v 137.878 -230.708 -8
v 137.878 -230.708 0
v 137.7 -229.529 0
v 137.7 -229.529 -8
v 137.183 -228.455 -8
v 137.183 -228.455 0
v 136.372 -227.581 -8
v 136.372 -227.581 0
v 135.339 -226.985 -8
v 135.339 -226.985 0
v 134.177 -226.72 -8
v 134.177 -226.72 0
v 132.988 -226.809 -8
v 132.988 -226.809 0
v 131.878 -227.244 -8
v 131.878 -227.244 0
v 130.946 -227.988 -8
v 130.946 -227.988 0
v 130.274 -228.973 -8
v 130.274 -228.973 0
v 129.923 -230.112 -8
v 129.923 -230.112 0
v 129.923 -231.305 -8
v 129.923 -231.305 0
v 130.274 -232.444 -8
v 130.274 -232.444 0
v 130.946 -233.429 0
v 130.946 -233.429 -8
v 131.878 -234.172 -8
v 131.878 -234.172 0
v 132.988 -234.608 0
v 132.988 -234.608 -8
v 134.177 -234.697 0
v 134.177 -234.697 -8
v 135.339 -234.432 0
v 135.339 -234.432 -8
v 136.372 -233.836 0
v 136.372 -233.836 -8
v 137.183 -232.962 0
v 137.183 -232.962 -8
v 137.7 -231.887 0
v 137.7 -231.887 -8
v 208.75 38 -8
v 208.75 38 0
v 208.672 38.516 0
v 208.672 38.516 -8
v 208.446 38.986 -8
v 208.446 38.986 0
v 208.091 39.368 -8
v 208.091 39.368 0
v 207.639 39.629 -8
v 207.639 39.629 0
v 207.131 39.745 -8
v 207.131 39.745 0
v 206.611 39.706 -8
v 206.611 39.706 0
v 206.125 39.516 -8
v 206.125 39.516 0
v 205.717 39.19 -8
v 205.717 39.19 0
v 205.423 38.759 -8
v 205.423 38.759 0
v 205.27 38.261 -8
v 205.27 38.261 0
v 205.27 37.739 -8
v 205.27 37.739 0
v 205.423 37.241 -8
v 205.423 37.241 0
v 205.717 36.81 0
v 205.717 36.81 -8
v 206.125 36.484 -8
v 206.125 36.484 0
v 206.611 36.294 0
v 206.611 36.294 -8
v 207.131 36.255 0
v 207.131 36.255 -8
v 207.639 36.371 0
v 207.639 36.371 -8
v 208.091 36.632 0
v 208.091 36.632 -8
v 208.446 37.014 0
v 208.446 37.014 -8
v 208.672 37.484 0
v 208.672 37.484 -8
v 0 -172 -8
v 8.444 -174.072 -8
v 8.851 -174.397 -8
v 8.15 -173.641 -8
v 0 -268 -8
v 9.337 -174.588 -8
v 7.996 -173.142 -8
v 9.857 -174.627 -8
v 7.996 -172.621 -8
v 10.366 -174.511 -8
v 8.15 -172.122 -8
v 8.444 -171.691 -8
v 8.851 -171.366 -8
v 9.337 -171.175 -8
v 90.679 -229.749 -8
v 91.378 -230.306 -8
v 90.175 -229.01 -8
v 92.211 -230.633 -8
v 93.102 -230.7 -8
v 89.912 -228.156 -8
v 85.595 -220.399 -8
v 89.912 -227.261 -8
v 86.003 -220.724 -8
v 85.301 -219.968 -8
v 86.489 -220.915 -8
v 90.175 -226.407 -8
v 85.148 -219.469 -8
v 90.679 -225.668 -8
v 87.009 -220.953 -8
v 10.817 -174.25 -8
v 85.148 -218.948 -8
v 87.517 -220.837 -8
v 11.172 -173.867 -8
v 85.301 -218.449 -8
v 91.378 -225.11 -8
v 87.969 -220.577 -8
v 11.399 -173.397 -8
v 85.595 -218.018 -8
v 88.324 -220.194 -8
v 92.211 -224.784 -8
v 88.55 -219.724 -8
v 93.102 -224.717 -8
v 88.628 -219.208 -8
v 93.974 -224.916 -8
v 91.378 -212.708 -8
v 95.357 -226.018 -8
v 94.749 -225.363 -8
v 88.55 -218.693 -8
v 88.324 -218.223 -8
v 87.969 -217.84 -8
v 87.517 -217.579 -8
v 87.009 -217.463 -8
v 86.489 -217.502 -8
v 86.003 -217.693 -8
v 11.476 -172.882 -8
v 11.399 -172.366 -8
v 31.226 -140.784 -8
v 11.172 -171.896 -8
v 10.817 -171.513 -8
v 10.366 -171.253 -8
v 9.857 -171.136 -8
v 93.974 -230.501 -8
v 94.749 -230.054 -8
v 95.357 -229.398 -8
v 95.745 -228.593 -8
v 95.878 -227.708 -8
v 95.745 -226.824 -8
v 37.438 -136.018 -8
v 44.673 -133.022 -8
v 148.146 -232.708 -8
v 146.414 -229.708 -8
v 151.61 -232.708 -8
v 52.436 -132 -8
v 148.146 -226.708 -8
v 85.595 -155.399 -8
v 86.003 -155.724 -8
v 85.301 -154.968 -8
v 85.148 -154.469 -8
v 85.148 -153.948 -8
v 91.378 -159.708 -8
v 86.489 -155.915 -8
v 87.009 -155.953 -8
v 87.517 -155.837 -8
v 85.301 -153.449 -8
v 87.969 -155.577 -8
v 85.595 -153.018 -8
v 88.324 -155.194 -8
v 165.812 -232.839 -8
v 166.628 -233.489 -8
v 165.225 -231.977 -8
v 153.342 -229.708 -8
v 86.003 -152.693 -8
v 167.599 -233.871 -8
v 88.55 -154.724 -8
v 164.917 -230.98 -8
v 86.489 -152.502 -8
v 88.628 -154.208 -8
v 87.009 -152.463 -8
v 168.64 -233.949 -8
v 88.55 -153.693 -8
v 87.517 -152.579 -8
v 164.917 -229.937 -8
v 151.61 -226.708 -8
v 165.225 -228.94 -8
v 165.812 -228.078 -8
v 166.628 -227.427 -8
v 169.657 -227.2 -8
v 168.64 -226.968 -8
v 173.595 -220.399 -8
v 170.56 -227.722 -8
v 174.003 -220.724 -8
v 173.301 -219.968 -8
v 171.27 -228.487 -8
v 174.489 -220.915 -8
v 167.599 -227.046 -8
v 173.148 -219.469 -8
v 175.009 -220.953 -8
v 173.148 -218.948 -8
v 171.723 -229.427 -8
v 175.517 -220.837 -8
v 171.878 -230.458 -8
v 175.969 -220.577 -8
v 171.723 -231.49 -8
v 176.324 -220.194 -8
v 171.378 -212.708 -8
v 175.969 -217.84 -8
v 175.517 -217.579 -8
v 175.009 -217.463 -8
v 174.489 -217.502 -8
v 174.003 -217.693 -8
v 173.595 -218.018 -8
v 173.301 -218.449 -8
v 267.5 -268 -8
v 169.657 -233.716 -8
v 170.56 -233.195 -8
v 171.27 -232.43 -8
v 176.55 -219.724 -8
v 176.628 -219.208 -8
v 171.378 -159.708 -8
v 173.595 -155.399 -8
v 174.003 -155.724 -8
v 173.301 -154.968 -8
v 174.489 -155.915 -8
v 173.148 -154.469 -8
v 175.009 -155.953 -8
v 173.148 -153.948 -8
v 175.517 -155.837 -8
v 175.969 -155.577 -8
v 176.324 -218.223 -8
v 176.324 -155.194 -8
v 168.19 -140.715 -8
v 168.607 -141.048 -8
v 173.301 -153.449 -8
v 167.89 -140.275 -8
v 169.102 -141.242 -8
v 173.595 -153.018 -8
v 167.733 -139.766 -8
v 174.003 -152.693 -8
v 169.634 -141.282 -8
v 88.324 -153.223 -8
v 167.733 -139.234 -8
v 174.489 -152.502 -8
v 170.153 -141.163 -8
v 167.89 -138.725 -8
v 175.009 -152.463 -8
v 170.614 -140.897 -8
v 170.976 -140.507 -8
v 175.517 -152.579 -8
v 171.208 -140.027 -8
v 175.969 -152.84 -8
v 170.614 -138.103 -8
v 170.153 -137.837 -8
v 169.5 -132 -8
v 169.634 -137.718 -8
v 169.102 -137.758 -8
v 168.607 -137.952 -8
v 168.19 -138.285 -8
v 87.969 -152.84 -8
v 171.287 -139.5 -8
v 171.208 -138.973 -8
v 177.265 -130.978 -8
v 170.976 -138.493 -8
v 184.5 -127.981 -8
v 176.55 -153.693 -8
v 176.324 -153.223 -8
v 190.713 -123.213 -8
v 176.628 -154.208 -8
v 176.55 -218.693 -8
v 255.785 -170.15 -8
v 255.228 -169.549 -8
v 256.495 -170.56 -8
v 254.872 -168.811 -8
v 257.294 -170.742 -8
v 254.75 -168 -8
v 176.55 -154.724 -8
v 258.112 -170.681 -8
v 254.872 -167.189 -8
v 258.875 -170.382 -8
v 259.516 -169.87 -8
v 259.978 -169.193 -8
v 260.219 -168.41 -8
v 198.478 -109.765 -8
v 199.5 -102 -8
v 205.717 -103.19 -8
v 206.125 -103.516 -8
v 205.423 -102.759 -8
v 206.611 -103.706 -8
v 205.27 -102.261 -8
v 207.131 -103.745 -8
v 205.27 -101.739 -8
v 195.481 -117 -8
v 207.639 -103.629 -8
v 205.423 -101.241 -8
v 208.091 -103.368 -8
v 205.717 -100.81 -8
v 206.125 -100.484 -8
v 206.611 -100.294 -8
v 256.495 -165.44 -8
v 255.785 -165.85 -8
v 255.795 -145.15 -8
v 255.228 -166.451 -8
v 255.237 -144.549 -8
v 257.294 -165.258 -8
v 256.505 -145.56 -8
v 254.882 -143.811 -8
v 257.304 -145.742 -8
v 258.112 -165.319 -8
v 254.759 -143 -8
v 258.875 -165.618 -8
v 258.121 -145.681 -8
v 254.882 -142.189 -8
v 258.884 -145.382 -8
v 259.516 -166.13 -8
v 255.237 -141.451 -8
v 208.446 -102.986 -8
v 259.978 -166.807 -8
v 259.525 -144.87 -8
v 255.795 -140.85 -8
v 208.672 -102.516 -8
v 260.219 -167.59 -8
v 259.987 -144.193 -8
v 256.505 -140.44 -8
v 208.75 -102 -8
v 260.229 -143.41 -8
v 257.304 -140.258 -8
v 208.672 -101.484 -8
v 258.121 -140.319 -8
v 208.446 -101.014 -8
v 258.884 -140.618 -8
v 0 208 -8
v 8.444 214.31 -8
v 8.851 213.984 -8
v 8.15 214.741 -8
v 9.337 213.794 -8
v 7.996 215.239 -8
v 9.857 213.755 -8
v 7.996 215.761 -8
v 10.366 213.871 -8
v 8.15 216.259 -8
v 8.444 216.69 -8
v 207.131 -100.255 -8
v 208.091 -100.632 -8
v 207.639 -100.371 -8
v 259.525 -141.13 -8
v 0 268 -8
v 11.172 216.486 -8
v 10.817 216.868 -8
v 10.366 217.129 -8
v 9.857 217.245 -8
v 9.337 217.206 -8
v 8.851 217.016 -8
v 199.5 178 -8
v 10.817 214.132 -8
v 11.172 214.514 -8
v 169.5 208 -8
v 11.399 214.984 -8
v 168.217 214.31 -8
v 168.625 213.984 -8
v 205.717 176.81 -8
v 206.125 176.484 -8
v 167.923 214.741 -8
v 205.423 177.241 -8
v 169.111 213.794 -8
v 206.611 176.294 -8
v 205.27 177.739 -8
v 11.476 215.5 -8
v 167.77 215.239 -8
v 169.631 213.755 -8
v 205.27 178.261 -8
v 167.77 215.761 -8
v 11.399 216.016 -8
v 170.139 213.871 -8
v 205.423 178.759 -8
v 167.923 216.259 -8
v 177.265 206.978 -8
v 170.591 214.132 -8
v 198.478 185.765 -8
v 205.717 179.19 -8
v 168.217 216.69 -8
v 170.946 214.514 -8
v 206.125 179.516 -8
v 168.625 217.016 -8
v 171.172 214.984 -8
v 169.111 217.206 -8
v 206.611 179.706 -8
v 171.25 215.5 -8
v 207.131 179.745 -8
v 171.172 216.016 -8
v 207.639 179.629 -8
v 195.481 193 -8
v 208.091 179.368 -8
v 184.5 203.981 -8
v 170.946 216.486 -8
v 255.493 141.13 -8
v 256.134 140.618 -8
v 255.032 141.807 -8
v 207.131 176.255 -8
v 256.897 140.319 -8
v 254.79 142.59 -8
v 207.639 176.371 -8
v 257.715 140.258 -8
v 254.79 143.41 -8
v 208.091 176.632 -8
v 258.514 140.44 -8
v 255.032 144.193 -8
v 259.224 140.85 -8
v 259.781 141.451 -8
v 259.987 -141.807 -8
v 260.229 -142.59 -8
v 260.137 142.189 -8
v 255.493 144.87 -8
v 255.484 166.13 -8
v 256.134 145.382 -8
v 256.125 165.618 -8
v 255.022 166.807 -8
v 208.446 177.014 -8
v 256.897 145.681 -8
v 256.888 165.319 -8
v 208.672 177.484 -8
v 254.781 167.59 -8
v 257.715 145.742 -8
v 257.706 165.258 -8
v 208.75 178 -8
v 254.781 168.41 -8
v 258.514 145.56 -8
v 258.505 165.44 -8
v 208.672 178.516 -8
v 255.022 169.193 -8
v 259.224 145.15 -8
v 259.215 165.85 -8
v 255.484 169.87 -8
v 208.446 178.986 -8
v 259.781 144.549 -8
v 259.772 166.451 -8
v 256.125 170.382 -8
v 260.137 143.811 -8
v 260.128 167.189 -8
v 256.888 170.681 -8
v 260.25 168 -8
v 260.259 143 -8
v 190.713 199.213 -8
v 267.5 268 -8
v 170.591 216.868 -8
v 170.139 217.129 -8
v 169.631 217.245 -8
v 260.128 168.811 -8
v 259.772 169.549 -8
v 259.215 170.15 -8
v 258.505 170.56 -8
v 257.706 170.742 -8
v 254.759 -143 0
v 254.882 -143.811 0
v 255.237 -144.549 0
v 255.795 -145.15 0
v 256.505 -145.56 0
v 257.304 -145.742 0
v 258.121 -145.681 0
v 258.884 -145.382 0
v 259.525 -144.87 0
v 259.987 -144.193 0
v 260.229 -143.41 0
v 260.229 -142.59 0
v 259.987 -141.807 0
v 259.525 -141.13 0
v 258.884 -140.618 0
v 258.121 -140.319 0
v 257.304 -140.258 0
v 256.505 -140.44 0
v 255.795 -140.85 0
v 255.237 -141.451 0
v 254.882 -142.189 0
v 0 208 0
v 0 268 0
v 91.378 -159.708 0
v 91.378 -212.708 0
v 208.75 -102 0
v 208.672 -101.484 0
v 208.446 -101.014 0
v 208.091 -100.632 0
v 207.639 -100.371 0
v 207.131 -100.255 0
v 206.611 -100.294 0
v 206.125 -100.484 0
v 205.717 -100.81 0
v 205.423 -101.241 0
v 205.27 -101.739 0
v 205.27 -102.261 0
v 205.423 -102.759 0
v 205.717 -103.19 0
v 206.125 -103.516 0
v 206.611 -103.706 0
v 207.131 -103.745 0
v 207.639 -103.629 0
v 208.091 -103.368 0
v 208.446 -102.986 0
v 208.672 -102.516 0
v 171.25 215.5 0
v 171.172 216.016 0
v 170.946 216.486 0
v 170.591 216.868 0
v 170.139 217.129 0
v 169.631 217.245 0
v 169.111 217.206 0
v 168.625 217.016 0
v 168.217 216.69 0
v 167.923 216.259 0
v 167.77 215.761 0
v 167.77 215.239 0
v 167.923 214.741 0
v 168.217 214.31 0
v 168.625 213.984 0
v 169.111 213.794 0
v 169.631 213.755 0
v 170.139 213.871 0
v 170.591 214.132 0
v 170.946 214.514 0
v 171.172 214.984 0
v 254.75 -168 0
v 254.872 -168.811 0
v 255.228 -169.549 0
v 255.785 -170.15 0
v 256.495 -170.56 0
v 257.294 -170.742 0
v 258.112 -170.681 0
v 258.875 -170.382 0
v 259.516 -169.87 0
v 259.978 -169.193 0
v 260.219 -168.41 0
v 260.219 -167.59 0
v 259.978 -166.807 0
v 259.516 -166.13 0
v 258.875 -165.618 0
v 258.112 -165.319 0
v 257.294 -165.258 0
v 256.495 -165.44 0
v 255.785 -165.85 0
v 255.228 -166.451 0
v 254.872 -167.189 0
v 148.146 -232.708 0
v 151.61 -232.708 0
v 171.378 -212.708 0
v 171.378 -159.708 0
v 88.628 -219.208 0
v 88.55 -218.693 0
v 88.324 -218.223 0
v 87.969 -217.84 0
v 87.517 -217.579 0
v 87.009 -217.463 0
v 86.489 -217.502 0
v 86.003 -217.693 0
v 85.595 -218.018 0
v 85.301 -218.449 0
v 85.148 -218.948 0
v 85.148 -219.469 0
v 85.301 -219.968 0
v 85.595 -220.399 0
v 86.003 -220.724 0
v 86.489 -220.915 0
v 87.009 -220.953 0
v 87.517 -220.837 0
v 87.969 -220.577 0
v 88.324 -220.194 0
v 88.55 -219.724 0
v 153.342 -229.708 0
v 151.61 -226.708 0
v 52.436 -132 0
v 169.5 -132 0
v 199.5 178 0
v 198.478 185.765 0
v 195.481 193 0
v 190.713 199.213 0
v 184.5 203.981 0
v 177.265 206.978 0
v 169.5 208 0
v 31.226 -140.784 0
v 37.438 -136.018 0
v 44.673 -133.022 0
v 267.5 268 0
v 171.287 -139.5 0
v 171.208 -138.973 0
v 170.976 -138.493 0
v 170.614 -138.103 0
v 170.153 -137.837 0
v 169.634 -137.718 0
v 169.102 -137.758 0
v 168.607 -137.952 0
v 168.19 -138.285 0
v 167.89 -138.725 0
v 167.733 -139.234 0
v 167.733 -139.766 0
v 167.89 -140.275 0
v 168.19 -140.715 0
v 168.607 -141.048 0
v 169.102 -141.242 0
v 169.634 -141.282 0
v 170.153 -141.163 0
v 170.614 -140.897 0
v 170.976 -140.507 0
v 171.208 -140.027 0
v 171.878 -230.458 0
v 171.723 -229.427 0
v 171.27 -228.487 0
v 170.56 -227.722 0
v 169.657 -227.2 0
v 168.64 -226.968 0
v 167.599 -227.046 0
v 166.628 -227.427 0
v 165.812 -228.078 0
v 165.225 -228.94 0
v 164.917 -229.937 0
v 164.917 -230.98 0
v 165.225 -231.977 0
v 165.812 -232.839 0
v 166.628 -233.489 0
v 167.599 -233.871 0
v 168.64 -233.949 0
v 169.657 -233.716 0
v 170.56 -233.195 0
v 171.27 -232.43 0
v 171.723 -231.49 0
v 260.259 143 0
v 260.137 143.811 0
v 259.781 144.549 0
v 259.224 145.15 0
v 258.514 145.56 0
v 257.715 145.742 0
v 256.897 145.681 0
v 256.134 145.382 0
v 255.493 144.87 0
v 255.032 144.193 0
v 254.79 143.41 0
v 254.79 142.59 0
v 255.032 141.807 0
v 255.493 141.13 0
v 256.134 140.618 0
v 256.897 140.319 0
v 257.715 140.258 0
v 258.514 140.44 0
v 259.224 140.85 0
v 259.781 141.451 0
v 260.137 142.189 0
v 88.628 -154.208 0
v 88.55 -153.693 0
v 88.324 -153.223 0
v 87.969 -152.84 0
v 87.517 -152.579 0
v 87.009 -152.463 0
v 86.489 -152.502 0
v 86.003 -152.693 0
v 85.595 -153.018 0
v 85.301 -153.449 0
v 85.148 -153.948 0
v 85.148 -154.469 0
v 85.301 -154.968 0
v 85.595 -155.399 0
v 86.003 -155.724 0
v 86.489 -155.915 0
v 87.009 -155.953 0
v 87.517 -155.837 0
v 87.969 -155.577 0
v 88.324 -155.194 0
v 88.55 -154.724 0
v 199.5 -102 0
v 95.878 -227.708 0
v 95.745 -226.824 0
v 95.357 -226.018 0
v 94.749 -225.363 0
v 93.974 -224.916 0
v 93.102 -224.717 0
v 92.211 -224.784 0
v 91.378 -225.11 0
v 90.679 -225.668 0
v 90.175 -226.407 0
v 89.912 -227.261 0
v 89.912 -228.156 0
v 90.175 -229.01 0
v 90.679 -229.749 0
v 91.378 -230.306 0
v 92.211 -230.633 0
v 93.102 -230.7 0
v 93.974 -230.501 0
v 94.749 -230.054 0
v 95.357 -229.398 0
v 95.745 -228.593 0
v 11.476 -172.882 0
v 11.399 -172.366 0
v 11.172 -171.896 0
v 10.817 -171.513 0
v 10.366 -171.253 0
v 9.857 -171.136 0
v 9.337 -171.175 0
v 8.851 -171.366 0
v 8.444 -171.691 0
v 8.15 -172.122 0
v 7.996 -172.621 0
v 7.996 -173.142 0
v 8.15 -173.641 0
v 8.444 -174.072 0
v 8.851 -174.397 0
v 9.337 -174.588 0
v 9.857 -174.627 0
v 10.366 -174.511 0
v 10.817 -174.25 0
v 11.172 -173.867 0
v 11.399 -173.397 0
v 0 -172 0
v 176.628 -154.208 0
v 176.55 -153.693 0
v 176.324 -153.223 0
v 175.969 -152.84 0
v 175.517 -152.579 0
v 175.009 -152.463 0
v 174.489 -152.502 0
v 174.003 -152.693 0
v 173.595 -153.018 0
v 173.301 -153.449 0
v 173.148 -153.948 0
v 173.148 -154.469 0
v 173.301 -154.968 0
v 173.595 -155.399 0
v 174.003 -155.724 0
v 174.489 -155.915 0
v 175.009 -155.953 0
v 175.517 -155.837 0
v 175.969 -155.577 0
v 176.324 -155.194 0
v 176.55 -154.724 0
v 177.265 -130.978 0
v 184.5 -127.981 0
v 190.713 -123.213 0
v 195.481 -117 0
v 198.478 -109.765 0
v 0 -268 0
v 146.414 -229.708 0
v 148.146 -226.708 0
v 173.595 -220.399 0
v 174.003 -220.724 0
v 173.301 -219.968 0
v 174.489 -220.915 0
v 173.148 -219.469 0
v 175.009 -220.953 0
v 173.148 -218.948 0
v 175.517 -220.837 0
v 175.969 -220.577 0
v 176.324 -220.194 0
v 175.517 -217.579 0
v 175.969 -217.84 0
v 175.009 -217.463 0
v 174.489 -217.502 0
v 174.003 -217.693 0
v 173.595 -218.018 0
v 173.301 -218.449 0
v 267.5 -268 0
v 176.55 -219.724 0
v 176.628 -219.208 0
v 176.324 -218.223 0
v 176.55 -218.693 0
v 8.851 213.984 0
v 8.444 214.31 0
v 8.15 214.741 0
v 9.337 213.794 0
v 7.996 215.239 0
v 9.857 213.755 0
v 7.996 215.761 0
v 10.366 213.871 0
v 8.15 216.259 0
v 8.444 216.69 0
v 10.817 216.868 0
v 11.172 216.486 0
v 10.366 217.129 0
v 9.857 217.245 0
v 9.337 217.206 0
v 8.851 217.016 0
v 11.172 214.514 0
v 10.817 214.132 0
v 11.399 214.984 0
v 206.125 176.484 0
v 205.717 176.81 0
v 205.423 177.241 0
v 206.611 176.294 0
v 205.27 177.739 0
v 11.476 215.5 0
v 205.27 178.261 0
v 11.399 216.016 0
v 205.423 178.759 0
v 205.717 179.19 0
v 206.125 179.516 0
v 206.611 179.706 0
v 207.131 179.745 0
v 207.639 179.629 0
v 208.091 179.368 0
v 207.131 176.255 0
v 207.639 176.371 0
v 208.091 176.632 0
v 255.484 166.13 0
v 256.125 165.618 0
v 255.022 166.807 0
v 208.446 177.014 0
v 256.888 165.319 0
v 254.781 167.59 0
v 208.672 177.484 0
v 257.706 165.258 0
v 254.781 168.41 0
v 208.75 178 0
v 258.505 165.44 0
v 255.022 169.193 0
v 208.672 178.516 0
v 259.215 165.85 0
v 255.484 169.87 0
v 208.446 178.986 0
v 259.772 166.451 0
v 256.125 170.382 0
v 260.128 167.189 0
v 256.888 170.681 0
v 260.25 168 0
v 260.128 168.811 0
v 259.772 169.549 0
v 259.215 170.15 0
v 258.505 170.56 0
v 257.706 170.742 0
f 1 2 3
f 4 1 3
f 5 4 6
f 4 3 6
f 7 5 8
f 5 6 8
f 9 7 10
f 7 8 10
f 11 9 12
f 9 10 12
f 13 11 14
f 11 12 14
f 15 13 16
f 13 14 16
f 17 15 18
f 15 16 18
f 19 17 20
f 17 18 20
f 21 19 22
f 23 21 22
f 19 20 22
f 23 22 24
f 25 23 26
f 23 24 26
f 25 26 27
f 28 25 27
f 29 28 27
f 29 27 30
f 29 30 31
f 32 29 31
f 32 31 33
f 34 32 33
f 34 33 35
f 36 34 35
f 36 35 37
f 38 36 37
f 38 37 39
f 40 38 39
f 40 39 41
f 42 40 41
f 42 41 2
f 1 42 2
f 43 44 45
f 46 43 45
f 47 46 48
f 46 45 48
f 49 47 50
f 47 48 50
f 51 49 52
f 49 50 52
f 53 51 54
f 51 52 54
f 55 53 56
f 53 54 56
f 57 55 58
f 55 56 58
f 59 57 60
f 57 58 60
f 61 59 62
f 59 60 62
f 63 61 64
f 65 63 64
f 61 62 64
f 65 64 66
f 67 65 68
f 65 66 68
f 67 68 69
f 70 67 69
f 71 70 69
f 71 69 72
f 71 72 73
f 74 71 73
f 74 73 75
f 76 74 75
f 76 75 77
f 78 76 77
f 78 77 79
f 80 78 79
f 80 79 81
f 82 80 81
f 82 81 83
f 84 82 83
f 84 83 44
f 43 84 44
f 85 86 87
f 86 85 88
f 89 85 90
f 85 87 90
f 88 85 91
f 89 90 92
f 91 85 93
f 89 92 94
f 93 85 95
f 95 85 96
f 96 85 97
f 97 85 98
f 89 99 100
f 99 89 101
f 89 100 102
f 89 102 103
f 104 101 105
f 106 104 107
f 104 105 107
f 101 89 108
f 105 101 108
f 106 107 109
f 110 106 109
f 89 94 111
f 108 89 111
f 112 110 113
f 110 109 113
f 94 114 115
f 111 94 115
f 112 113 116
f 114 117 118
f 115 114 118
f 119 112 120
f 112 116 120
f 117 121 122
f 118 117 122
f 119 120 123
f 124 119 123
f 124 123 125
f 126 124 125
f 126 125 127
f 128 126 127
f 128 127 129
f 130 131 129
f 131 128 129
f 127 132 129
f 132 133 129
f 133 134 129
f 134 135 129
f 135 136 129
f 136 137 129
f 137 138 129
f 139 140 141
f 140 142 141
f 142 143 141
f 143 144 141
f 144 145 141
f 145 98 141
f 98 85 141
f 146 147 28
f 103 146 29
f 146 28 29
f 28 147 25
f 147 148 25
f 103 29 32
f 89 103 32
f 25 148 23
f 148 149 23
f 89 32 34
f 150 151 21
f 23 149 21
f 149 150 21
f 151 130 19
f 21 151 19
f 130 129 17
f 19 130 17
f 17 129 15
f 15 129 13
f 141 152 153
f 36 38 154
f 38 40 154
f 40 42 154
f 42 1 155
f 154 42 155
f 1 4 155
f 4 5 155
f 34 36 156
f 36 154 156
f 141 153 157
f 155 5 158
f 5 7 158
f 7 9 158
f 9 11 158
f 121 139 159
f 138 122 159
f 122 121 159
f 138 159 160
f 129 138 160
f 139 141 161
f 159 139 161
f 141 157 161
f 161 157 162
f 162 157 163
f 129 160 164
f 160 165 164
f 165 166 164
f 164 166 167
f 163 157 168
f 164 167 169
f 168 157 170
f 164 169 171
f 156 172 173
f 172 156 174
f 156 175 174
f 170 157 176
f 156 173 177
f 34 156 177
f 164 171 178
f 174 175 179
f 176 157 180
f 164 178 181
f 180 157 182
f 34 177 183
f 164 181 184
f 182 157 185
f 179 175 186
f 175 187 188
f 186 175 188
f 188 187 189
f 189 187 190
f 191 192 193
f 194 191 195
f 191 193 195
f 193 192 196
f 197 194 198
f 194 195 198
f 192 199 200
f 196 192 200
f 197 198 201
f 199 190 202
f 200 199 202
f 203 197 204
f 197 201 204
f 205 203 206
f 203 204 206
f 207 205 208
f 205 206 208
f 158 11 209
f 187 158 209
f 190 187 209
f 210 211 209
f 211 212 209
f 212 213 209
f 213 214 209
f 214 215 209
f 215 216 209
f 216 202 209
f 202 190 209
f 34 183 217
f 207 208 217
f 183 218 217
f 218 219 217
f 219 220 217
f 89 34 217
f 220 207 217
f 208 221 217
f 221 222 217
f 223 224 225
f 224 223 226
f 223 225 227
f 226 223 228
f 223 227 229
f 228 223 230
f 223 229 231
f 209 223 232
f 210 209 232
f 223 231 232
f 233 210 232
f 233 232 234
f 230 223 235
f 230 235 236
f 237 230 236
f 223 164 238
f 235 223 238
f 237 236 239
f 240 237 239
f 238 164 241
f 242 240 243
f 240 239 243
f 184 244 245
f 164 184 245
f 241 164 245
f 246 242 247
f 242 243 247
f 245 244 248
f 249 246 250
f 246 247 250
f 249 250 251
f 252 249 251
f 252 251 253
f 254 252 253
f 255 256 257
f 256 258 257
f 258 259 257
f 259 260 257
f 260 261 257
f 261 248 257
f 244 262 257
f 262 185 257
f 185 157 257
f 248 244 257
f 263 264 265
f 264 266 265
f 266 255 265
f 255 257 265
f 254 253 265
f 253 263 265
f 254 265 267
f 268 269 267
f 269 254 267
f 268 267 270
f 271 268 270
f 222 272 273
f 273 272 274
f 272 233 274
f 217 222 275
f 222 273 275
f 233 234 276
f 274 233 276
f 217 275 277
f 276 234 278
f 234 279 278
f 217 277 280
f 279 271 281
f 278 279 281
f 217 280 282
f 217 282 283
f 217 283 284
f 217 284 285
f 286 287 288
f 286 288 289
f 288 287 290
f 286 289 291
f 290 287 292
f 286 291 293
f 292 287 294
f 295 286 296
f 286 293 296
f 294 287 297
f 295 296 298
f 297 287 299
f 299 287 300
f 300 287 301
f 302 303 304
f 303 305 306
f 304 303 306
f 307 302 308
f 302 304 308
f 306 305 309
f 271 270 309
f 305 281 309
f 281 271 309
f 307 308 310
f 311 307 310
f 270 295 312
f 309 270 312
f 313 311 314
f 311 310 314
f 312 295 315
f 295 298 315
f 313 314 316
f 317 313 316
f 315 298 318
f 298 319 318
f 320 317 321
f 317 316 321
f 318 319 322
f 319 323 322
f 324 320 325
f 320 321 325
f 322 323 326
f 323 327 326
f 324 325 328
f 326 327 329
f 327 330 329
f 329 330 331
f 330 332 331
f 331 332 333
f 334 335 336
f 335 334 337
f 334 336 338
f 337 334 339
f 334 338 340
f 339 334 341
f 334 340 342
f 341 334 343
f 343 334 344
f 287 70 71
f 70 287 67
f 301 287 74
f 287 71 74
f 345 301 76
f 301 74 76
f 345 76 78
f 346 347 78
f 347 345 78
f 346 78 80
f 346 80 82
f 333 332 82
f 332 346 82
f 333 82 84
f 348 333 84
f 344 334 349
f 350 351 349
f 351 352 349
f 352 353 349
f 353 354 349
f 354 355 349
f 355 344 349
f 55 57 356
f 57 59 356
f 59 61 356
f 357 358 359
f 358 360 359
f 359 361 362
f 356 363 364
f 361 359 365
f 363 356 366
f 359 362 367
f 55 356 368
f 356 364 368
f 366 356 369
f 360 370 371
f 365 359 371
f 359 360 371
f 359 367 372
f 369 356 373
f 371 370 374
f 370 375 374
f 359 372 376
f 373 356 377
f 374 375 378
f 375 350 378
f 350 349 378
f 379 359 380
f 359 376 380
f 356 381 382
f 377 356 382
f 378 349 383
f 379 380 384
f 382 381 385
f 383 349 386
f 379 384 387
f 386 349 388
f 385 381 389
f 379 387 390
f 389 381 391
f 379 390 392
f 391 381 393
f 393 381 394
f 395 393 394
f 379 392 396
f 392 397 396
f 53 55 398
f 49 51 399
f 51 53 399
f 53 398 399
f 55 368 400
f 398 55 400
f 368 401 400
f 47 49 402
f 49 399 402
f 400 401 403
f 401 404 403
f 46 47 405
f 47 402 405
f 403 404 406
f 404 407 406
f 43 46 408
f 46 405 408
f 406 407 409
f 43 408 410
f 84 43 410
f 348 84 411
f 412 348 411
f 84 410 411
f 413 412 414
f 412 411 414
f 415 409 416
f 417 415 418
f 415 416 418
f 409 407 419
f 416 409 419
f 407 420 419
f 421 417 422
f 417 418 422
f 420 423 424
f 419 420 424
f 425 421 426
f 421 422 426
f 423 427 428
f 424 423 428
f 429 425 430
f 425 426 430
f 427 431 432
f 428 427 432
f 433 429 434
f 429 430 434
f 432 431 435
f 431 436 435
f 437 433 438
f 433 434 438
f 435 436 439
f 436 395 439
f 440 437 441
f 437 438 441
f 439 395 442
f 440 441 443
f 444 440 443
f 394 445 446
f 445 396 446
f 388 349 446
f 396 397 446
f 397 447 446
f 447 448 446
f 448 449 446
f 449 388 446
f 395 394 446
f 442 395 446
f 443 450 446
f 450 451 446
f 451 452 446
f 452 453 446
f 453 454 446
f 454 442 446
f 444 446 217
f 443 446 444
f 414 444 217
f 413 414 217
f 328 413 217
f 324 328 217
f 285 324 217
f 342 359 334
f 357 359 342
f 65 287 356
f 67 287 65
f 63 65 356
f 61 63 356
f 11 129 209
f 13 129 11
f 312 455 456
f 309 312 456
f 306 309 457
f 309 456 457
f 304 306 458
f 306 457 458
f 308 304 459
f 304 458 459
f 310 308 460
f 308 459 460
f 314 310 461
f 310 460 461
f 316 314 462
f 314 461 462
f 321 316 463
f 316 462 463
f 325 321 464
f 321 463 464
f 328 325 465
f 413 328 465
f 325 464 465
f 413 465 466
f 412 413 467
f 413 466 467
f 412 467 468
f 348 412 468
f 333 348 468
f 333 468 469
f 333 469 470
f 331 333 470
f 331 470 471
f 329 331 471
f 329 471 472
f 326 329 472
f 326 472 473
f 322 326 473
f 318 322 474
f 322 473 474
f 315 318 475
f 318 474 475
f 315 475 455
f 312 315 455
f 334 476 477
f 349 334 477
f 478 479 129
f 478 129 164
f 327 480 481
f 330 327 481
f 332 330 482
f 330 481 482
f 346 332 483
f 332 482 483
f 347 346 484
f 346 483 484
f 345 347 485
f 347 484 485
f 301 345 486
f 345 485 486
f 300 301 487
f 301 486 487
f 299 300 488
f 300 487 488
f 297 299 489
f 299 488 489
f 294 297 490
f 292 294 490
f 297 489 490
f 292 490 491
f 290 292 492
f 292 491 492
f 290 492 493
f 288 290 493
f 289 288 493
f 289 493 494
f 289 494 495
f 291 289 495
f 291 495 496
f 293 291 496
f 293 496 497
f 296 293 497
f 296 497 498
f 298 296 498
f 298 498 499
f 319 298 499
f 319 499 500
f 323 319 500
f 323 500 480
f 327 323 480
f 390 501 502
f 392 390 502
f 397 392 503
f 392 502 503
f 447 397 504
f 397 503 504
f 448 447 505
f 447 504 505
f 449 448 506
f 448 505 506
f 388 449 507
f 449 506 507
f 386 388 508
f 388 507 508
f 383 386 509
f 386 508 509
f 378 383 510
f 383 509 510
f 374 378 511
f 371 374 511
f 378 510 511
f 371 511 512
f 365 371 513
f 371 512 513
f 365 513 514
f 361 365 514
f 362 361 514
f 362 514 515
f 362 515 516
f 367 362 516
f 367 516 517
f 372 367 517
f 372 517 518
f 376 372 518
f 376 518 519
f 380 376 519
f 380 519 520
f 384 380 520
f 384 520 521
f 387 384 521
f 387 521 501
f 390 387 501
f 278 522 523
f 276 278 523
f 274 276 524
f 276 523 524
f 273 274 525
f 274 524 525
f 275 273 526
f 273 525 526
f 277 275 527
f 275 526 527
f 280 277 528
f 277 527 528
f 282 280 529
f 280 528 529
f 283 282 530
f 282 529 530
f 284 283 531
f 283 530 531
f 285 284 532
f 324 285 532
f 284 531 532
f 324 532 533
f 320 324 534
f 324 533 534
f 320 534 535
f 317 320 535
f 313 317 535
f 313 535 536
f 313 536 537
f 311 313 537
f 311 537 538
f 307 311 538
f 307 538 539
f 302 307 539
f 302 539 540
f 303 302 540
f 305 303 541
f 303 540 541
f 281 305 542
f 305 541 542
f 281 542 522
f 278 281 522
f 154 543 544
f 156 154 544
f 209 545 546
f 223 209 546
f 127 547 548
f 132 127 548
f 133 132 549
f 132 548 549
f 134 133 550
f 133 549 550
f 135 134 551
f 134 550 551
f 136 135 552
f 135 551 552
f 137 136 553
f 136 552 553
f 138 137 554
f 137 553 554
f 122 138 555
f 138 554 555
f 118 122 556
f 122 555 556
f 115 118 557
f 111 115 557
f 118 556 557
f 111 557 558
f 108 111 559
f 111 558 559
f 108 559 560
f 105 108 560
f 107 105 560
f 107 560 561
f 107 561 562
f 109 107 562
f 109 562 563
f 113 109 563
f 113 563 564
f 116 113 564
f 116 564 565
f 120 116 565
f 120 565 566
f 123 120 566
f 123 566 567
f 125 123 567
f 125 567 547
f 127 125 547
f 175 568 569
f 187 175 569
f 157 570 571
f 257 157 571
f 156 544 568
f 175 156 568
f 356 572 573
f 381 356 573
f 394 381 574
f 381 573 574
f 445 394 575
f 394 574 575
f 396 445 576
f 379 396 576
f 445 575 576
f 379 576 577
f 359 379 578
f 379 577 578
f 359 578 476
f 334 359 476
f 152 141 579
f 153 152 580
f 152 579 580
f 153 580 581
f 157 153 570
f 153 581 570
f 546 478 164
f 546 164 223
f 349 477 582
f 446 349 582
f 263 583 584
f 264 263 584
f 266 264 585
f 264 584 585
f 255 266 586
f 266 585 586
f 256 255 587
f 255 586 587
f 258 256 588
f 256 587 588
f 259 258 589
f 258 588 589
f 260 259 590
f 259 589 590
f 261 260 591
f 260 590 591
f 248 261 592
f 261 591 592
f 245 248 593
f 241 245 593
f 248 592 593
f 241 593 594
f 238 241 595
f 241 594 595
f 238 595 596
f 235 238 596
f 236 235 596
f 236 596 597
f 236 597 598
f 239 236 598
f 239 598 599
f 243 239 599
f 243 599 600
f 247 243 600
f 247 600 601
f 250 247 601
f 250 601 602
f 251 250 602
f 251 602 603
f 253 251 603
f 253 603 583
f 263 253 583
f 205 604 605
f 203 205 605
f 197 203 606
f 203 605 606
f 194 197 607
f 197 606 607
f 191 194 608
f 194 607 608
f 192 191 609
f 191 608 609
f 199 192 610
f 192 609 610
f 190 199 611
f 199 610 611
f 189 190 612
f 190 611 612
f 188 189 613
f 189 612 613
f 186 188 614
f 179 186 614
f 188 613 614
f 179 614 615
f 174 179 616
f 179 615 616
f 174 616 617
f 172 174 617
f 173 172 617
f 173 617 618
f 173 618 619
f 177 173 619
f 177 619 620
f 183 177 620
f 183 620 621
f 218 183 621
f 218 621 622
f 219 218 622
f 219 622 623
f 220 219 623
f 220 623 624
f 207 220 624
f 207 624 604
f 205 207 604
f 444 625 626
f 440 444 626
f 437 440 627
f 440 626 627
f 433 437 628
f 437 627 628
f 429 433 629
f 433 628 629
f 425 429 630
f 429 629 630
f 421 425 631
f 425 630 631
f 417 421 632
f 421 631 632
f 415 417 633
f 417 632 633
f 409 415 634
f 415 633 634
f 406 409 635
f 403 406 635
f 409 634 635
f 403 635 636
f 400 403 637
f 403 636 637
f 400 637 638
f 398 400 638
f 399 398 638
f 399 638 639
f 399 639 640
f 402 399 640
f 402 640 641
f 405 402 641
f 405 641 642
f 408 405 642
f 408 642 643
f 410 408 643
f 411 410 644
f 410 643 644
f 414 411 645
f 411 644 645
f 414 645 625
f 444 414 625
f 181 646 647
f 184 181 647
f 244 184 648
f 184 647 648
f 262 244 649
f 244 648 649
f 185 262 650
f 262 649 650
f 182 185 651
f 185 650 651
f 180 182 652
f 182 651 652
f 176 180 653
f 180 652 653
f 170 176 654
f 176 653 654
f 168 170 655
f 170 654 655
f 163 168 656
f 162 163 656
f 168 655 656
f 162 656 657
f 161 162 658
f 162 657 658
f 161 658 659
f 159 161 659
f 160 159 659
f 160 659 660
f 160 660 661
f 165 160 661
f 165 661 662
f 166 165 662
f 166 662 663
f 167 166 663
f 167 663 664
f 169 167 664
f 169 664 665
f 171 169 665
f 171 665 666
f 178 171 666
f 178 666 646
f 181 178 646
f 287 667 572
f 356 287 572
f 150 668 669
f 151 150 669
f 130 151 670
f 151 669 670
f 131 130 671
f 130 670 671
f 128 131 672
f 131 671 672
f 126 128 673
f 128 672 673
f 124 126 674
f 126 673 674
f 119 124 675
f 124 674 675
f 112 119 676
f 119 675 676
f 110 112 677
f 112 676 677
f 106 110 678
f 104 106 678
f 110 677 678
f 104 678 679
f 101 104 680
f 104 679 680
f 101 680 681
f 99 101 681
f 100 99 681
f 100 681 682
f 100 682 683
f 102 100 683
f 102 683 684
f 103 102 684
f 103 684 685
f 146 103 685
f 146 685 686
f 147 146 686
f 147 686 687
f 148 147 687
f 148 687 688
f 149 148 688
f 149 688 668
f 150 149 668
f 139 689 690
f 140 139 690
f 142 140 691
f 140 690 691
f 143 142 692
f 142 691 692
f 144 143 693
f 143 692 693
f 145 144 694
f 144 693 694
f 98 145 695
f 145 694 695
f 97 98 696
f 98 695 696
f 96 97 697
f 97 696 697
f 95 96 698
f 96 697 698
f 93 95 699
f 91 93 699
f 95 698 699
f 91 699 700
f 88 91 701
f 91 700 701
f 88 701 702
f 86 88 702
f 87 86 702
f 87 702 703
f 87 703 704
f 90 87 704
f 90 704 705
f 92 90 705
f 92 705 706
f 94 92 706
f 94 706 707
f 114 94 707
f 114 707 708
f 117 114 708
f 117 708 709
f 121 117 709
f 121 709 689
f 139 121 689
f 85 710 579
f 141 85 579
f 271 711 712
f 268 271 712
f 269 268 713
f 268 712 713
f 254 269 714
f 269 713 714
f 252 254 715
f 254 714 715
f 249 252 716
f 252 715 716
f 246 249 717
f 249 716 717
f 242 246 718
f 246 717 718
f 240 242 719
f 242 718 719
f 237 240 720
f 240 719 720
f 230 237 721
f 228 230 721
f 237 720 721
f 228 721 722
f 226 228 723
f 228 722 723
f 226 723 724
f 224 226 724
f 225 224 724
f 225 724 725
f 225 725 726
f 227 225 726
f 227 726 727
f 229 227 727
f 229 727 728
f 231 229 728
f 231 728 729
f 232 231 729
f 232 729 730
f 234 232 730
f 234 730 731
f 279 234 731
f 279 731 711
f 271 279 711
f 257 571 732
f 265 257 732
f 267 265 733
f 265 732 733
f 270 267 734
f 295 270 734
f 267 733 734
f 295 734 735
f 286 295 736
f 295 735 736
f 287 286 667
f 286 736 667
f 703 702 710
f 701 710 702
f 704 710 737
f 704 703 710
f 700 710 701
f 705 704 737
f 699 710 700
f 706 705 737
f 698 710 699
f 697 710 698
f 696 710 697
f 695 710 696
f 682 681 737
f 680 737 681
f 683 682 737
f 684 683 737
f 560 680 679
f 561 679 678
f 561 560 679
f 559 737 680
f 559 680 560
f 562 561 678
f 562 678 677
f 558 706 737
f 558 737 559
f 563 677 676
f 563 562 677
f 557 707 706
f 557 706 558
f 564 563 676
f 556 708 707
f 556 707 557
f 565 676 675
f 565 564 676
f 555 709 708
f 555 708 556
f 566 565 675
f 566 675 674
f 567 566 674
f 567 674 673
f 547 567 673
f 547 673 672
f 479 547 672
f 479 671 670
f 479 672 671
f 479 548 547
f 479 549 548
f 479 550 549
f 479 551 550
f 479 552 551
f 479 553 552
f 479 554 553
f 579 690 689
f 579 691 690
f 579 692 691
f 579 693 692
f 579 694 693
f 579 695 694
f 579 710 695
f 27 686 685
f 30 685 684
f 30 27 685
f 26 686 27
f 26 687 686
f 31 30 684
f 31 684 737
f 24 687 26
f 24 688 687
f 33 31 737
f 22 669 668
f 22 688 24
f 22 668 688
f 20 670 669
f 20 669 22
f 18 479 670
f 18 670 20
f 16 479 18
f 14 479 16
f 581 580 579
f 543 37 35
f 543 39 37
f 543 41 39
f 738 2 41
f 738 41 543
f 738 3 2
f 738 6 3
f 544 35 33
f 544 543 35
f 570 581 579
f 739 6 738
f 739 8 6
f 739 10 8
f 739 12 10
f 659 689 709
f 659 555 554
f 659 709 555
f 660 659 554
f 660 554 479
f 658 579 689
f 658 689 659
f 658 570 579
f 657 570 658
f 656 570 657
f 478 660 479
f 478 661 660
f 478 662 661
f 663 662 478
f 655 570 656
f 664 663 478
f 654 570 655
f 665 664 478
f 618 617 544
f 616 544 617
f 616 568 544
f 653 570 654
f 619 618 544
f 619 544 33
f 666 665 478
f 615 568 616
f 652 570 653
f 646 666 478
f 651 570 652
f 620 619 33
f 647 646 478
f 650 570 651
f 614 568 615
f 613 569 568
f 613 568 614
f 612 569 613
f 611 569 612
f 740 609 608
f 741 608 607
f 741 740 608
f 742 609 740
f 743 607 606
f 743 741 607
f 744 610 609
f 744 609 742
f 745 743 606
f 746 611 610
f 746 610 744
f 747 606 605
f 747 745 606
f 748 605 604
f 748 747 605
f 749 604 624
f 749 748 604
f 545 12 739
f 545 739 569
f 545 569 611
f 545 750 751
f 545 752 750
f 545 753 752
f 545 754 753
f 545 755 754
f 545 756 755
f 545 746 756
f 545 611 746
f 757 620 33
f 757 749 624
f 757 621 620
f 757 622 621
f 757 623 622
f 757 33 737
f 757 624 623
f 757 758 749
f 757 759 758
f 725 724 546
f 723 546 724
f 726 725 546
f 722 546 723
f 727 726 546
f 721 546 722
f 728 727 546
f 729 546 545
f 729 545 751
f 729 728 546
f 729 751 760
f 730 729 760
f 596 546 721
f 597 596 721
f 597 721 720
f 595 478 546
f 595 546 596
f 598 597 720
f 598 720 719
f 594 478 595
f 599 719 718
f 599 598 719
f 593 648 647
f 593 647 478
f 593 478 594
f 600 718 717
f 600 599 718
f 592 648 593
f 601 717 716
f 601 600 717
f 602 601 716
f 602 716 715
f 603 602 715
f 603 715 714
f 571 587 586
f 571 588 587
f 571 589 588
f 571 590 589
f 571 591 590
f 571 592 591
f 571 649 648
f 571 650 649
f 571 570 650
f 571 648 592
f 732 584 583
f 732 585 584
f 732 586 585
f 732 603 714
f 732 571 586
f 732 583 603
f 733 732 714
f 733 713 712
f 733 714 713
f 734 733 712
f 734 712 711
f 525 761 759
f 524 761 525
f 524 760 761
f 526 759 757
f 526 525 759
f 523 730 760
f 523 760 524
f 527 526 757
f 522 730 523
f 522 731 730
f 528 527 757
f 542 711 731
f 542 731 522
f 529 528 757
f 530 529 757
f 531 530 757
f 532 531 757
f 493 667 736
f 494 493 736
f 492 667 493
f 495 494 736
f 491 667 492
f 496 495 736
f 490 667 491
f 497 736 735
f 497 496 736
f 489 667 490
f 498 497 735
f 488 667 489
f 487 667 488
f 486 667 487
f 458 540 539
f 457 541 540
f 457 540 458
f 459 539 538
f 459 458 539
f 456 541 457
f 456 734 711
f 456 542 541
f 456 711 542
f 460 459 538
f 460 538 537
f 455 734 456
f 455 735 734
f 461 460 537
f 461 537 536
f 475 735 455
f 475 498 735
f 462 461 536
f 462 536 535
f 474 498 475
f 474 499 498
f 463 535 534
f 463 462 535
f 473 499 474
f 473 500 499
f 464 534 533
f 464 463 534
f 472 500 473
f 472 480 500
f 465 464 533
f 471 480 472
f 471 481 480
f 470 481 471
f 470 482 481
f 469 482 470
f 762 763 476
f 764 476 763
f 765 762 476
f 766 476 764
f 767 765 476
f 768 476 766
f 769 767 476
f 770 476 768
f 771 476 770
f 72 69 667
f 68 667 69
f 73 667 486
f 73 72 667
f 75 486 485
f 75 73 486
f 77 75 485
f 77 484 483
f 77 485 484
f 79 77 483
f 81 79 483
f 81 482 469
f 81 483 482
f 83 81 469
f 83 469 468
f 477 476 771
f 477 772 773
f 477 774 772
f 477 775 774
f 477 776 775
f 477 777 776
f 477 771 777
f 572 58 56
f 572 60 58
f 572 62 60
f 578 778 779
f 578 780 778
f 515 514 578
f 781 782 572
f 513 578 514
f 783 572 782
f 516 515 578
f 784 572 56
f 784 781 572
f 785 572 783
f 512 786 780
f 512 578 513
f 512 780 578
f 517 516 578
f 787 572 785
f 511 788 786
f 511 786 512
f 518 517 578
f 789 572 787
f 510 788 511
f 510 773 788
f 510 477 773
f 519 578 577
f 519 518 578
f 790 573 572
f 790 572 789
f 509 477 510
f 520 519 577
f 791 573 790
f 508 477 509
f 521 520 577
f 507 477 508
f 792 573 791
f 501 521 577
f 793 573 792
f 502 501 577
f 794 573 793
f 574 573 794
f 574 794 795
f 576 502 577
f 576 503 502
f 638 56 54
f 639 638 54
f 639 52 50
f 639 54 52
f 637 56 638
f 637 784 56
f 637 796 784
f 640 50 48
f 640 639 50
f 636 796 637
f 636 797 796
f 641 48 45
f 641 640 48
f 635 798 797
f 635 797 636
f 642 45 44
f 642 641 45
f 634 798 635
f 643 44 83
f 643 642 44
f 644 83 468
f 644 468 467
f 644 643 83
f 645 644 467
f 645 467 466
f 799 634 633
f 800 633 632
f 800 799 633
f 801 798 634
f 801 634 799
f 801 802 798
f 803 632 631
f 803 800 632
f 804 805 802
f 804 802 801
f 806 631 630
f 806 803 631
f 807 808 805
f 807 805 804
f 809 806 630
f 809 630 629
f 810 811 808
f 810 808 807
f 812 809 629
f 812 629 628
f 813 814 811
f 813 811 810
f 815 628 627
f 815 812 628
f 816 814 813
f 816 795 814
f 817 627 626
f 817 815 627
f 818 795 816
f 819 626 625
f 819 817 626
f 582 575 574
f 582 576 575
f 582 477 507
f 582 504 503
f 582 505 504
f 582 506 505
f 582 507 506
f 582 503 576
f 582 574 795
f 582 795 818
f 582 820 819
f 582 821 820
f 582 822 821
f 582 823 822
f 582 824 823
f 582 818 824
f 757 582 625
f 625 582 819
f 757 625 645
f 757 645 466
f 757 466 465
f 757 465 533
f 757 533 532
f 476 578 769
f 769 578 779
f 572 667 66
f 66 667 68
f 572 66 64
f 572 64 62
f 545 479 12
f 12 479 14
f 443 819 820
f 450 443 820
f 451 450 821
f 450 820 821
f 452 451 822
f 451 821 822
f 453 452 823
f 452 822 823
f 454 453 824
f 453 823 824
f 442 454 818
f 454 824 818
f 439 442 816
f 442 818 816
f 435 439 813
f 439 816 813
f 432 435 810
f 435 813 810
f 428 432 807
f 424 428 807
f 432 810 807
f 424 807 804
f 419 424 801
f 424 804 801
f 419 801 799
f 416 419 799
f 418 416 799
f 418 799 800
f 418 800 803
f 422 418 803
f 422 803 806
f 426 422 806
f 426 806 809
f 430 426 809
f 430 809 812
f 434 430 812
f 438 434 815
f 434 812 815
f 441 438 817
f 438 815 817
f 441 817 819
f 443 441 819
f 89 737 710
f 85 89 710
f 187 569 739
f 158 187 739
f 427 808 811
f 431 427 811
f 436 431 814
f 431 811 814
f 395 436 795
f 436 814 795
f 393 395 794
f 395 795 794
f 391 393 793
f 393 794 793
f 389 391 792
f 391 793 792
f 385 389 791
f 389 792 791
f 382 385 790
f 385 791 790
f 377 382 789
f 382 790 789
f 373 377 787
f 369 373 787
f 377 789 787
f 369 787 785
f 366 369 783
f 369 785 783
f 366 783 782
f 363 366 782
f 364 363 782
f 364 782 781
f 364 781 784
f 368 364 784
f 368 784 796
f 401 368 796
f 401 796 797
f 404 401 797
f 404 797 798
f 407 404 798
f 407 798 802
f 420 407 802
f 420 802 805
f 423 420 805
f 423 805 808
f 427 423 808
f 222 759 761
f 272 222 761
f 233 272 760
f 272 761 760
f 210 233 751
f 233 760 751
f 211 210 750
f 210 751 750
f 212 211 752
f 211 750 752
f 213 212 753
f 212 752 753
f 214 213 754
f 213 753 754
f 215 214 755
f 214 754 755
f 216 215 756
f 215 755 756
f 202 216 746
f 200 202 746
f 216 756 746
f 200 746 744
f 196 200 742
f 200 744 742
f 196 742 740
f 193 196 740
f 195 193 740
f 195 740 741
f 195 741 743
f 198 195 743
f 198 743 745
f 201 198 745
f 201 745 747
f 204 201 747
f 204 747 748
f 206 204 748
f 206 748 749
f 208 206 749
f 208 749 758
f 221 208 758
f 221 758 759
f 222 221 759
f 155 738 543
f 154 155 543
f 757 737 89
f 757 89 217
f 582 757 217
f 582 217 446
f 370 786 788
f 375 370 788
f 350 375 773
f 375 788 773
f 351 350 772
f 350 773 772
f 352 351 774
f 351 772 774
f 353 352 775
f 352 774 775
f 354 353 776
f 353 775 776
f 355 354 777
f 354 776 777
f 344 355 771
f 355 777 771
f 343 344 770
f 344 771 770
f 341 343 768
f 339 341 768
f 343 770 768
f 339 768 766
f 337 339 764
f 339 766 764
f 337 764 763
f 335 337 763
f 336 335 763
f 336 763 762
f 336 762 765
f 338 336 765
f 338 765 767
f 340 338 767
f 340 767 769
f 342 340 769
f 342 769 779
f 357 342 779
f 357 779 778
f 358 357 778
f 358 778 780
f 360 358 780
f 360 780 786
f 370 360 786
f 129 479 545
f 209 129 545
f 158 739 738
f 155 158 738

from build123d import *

# Parameters (mm, degrees)
SKETCH1_W           = 267.5
SKETCH1_H           = 536
SKETCH1_R           = 2.75
BOSS_EXTRUDE1_DEPTH = 8
SKETCH3_R           = 2.75
SKETCH3_R_2         = 1.75
SKETCH3_R_3         = 3.5
SKETCH3_R_4         = 4
SKETCH3_R_5         = 3
SKETCH3_W           = 80
SKETCH3_H           = 53
CUT_EXTRUDE3_DEPTH  = 379.740346412
SKETCH4_R           = 1.75
SKETCH4_R_2         = 1.786950001
CUT_EXTRUDE4_DEPTH  = 10


with BuildPart() as part:
    # Sketch1 → Boss-Extrude1 (new body)
    with BuildSketch(Plane.XY):
        with Locations((133.75, 0)):
            Rectangle(SKETCH1_W, SKETCH1_H)
        with Locations(Location((257.5, -168, 0), (0, 0, 180))):
            Circle(SKETCH1_R, mode=Mode.SUBTRACT)
        with Locations(Location((257.509341423, -143.000001745, 0), (0, 0, 180))):
            Circle(SKETCH1_R, mode=Mode.SUBTRACT)
        with Locations((257.509341423, 143.000001745)):
            Circle(SKETCH1_R, mode=Mode.SUBTRACT)
        with Locations((257.5, 168)):
            Circle(SKETCH1_R, mode=Mode.SUBTRACT)
    extrude(amount=-BOSS_EXTRUDE1_DEPTH)

    # Sketch3 → Cut-Extrude3 (cut, through all)
    with BuildSketch(Plane.XY):
        with Locations(Location((257.509341423, -143.000001745, 0), (0, 0, 180))):
            Circle(SKETCH3_R)
        with Locations(Location((257.5, -168, 0), (0, 0, 180))):
            Circle(SKETCH3_R)
        with Locations((86.878100048, -154.208377346)):
            Circle(SKETCH3_R_2)
        with Locations((174.878100048, -154.208377346)):
            Circle(SKETCH3_R_2)
        with Locations((174.878100048, -219.208377346)):
            Circle(SKETCH3_R_2)
        with Locations((86.878100048, -219.208377346)):
            Circle(SKETCH3_R_2)
        with Locations((168.378100048, -230.458377346)):
            Circle(SKETCH3_R_3)
        with Locations((133.878100048, -230.708377346)):
            Circle(SKETCH3_R_4)
        with Locations((92.878100048, -227.708377346)):
            Circle(SKETCH3_R_5)
        with BuildLine():
            Line((0, 208), (0, -172))
            Line((0, -172), (31.225700951, -140.783627636))
            ThreePointArc((31.225700951, -140.783627636), (40.957302403, -134.282756532), (52.435734985, -132))
            Line((52.435734985, -132), (169.5, -132))
            ThreePointArc((169.5, -132), (190.713203436, -123.213203436), (199.5, -102))
            Line((199.5, -102), (199.5, 178))
            ThreePointArc((199.5, 178), (190.713203436, 199.213203436), (169.5, 208))
            Line((169.5, 208), (0, 208))
        make_face()
        Polygon((153.342201663, -229.708377346), (151.610150855, -226.708377346), (148.14604924, -226.708377346), (146.413998433, -229.708377346), (148.14604924, -232.708377346), (151.610150855, -232.708377346), align=None)
        with Locations((131.378100048, -186.208377346)):
            Rectangle(SKETCH3_W, SKETCH3_H)
    extrude(amount=-CUT_EXTRUDE3_DEPTH, mode=Mode.SUBTRACT)

    # Sketch4 → Cut-Extrude4 (cut)
    with BuildSketch(Plane.XY):
        with Locations((9.726391767, -172.881531455)):
            Circle(SKETCH4_R)
        with Locations((169.5, -139.5)):
            Circle(SKETCH4_R_2)
        with Locations((207, -102)):
            Circle(SKETCH4_R)
        with Locations((207, 38)):
            Circle(SKETCH4_R)
        with Locations((207, 178)):
            Circle(SKETCH4_R)
        with Locations((169.5, 215.5)):
            Circle(SKETCH4_R)
        with Locations((9.726391767, 215.5)):
            Circle(SKETCH4_R)
    extrude(amount=-CUT_EXTRUDE4_DEPTH, mode=Mode.SUBTRACT)


solid = part.part
